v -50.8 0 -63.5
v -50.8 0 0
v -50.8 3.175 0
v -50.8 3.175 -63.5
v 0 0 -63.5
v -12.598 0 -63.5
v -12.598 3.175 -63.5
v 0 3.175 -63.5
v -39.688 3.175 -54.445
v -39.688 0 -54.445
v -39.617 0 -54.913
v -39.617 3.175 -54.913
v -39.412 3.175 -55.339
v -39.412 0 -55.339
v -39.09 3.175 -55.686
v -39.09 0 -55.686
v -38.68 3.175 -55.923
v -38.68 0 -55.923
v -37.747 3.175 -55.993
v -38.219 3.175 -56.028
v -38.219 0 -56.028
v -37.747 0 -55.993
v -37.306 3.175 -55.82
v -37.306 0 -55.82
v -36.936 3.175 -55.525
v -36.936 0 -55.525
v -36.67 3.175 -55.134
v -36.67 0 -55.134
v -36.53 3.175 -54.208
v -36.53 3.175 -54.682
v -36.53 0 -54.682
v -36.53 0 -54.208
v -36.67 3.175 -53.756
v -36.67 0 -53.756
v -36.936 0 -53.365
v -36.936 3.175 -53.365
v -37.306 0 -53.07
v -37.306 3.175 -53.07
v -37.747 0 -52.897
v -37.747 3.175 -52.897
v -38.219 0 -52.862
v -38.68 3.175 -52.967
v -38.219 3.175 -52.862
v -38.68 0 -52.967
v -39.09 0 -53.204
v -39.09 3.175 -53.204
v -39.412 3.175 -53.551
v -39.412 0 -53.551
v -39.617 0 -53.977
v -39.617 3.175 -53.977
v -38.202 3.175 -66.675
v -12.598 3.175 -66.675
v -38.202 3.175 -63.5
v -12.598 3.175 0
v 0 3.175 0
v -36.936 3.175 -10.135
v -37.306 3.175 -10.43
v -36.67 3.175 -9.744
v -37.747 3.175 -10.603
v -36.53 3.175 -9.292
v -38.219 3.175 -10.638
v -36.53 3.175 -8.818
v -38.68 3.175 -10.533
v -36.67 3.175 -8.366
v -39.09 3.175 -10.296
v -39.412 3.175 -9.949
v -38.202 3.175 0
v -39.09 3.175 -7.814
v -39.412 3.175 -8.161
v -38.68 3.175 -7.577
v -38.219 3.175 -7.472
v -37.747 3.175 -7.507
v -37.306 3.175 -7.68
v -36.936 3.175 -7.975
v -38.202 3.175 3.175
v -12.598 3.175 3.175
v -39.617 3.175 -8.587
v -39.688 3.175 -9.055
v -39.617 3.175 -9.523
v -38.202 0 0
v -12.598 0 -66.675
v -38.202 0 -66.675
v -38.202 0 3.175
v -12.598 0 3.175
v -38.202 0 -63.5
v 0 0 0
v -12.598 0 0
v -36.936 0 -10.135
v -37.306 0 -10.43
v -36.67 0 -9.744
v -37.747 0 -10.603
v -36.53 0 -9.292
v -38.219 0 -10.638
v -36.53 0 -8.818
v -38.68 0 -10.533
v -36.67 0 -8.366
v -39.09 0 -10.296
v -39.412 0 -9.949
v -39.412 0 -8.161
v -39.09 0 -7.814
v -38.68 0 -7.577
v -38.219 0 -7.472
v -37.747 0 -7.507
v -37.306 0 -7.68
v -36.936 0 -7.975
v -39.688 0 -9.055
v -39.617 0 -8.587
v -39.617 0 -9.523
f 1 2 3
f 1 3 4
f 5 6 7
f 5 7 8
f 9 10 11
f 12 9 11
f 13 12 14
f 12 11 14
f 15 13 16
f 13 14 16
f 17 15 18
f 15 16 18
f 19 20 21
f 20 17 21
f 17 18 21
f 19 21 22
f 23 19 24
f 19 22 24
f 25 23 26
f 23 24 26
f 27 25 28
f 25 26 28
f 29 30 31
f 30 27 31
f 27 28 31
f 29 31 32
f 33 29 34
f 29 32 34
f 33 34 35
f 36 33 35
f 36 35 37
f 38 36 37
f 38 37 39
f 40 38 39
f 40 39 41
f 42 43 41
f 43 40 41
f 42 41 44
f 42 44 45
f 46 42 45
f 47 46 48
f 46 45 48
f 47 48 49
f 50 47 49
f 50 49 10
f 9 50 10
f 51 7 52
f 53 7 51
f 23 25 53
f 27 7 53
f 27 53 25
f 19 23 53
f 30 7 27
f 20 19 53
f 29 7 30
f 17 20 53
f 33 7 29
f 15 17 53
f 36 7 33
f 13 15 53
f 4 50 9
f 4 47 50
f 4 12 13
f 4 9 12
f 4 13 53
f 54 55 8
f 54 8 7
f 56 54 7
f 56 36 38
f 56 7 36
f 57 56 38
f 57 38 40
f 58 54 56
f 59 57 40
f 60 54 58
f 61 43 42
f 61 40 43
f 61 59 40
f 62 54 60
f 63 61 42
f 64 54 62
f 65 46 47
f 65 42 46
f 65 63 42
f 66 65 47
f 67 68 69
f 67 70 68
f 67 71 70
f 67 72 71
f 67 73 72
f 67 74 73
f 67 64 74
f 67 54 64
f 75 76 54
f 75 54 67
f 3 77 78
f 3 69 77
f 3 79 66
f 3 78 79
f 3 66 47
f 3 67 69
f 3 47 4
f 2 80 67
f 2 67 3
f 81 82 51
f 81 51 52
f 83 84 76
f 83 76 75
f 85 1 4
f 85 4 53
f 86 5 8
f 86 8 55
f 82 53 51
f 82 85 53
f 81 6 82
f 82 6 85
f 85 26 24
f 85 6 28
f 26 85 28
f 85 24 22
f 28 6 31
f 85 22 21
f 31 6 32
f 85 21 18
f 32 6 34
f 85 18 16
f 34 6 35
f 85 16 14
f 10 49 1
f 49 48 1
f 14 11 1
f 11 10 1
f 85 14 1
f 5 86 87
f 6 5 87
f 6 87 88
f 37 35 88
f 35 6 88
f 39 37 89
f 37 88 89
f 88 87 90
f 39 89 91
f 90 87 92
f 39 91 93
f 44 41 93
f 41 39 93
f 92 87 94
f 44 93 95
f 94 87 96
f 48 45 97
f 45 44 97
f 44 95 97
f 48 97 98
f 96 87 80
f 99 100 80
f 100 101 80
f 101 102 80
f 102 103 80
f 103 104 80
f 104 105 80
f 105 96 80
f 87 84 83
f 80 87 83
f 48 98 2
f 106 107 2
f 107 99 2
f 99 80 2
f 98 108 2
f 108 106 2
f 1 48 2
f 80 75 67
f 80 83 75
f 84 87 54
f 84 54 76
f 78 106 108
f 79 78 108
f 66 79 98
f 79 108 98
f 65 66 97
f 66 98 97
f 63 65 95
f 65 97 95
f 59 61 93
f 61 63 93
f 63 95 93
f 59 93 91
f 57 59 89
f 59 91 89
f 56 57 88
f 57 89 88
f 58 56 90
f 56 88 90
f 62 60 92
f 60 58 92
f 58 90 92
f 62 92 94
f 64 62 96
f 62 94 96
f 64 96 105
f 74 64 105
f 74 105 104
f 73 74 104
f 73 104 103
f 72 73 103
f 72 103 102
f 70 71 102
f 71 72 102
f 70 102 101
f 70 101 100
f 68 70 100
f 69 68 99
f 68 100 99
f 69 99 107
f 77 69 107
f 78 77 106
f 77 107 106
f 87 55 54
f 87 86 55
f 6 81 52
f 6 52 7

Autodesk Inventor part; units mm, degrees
ref_plane "YZ Plane" through (0, 0, 0) normal (1, 0, 0) x (0, 1, 0)
ref_plane "XZ Plane" through (0, 0, 0) normal (0, 1, 0) x (-1, 0, 0)
ref_plane "XY Plane" through (0, 0, 0) normal (0, 0, 1) x (1, 0, 0)
sketch "Sketch1" plane through (0, 0, 0) normal (0, 1, 0) x (-1, 0, 0)
  line L0 (0, 0) -> (12.5984, 0)
  line L1 (12.5984, 0) -> (12.5984, 3.175)
  line L2 (12.5984, 3.175) -> (38.2016, 3.175)
  line L3 (38.2016, 3.175) -> (38.2016, 0)
  line L4 (38.2016, 0) -> (50.8, 0)
  line L5 (50.8, 0) -> (50.8, -63.5)
  line L6 (50.8, -63.5) -> (38.2016, -63.5)
  line L7 (38.2016, -63.5) -> (38.2016, -66.675)
  line L8 (38.2016, -66.675) -> (12.5984, -66.675)
  line L9 (12.5984, -66.675) -> (12.5984, -63.5)
  line L10 (12.5984, -63.5) -> (0, -63.5)
  line L11 (0, -63.5) -> (0, 0)
  circle A0 centre (38.1, -9.0551) radius 1.5875
  circle A1 centre (38.1, -54.4449) radius 1.5875
  dimension "d0" = 12.5984
  dimension "d1" = 3.175
  dimension "d2" = 25.6032
  dimension "d3" = 63.5
  dimension "d4" = 3.175
  dimension "d5" = 50.8
  dimension "d6" = 3.175
  dimension "d7" = 3.175
  dimension "d8" = 45.3898
  dimension "d9" = 12.7
  dimension "d10" = 9.0551
extrude "Extrusion1" add sketch "Sketch1" along normal blind 3.175
equation "\"d10\" = -0.5 * d8 + 0.5 * d3"
properties part number "top"
